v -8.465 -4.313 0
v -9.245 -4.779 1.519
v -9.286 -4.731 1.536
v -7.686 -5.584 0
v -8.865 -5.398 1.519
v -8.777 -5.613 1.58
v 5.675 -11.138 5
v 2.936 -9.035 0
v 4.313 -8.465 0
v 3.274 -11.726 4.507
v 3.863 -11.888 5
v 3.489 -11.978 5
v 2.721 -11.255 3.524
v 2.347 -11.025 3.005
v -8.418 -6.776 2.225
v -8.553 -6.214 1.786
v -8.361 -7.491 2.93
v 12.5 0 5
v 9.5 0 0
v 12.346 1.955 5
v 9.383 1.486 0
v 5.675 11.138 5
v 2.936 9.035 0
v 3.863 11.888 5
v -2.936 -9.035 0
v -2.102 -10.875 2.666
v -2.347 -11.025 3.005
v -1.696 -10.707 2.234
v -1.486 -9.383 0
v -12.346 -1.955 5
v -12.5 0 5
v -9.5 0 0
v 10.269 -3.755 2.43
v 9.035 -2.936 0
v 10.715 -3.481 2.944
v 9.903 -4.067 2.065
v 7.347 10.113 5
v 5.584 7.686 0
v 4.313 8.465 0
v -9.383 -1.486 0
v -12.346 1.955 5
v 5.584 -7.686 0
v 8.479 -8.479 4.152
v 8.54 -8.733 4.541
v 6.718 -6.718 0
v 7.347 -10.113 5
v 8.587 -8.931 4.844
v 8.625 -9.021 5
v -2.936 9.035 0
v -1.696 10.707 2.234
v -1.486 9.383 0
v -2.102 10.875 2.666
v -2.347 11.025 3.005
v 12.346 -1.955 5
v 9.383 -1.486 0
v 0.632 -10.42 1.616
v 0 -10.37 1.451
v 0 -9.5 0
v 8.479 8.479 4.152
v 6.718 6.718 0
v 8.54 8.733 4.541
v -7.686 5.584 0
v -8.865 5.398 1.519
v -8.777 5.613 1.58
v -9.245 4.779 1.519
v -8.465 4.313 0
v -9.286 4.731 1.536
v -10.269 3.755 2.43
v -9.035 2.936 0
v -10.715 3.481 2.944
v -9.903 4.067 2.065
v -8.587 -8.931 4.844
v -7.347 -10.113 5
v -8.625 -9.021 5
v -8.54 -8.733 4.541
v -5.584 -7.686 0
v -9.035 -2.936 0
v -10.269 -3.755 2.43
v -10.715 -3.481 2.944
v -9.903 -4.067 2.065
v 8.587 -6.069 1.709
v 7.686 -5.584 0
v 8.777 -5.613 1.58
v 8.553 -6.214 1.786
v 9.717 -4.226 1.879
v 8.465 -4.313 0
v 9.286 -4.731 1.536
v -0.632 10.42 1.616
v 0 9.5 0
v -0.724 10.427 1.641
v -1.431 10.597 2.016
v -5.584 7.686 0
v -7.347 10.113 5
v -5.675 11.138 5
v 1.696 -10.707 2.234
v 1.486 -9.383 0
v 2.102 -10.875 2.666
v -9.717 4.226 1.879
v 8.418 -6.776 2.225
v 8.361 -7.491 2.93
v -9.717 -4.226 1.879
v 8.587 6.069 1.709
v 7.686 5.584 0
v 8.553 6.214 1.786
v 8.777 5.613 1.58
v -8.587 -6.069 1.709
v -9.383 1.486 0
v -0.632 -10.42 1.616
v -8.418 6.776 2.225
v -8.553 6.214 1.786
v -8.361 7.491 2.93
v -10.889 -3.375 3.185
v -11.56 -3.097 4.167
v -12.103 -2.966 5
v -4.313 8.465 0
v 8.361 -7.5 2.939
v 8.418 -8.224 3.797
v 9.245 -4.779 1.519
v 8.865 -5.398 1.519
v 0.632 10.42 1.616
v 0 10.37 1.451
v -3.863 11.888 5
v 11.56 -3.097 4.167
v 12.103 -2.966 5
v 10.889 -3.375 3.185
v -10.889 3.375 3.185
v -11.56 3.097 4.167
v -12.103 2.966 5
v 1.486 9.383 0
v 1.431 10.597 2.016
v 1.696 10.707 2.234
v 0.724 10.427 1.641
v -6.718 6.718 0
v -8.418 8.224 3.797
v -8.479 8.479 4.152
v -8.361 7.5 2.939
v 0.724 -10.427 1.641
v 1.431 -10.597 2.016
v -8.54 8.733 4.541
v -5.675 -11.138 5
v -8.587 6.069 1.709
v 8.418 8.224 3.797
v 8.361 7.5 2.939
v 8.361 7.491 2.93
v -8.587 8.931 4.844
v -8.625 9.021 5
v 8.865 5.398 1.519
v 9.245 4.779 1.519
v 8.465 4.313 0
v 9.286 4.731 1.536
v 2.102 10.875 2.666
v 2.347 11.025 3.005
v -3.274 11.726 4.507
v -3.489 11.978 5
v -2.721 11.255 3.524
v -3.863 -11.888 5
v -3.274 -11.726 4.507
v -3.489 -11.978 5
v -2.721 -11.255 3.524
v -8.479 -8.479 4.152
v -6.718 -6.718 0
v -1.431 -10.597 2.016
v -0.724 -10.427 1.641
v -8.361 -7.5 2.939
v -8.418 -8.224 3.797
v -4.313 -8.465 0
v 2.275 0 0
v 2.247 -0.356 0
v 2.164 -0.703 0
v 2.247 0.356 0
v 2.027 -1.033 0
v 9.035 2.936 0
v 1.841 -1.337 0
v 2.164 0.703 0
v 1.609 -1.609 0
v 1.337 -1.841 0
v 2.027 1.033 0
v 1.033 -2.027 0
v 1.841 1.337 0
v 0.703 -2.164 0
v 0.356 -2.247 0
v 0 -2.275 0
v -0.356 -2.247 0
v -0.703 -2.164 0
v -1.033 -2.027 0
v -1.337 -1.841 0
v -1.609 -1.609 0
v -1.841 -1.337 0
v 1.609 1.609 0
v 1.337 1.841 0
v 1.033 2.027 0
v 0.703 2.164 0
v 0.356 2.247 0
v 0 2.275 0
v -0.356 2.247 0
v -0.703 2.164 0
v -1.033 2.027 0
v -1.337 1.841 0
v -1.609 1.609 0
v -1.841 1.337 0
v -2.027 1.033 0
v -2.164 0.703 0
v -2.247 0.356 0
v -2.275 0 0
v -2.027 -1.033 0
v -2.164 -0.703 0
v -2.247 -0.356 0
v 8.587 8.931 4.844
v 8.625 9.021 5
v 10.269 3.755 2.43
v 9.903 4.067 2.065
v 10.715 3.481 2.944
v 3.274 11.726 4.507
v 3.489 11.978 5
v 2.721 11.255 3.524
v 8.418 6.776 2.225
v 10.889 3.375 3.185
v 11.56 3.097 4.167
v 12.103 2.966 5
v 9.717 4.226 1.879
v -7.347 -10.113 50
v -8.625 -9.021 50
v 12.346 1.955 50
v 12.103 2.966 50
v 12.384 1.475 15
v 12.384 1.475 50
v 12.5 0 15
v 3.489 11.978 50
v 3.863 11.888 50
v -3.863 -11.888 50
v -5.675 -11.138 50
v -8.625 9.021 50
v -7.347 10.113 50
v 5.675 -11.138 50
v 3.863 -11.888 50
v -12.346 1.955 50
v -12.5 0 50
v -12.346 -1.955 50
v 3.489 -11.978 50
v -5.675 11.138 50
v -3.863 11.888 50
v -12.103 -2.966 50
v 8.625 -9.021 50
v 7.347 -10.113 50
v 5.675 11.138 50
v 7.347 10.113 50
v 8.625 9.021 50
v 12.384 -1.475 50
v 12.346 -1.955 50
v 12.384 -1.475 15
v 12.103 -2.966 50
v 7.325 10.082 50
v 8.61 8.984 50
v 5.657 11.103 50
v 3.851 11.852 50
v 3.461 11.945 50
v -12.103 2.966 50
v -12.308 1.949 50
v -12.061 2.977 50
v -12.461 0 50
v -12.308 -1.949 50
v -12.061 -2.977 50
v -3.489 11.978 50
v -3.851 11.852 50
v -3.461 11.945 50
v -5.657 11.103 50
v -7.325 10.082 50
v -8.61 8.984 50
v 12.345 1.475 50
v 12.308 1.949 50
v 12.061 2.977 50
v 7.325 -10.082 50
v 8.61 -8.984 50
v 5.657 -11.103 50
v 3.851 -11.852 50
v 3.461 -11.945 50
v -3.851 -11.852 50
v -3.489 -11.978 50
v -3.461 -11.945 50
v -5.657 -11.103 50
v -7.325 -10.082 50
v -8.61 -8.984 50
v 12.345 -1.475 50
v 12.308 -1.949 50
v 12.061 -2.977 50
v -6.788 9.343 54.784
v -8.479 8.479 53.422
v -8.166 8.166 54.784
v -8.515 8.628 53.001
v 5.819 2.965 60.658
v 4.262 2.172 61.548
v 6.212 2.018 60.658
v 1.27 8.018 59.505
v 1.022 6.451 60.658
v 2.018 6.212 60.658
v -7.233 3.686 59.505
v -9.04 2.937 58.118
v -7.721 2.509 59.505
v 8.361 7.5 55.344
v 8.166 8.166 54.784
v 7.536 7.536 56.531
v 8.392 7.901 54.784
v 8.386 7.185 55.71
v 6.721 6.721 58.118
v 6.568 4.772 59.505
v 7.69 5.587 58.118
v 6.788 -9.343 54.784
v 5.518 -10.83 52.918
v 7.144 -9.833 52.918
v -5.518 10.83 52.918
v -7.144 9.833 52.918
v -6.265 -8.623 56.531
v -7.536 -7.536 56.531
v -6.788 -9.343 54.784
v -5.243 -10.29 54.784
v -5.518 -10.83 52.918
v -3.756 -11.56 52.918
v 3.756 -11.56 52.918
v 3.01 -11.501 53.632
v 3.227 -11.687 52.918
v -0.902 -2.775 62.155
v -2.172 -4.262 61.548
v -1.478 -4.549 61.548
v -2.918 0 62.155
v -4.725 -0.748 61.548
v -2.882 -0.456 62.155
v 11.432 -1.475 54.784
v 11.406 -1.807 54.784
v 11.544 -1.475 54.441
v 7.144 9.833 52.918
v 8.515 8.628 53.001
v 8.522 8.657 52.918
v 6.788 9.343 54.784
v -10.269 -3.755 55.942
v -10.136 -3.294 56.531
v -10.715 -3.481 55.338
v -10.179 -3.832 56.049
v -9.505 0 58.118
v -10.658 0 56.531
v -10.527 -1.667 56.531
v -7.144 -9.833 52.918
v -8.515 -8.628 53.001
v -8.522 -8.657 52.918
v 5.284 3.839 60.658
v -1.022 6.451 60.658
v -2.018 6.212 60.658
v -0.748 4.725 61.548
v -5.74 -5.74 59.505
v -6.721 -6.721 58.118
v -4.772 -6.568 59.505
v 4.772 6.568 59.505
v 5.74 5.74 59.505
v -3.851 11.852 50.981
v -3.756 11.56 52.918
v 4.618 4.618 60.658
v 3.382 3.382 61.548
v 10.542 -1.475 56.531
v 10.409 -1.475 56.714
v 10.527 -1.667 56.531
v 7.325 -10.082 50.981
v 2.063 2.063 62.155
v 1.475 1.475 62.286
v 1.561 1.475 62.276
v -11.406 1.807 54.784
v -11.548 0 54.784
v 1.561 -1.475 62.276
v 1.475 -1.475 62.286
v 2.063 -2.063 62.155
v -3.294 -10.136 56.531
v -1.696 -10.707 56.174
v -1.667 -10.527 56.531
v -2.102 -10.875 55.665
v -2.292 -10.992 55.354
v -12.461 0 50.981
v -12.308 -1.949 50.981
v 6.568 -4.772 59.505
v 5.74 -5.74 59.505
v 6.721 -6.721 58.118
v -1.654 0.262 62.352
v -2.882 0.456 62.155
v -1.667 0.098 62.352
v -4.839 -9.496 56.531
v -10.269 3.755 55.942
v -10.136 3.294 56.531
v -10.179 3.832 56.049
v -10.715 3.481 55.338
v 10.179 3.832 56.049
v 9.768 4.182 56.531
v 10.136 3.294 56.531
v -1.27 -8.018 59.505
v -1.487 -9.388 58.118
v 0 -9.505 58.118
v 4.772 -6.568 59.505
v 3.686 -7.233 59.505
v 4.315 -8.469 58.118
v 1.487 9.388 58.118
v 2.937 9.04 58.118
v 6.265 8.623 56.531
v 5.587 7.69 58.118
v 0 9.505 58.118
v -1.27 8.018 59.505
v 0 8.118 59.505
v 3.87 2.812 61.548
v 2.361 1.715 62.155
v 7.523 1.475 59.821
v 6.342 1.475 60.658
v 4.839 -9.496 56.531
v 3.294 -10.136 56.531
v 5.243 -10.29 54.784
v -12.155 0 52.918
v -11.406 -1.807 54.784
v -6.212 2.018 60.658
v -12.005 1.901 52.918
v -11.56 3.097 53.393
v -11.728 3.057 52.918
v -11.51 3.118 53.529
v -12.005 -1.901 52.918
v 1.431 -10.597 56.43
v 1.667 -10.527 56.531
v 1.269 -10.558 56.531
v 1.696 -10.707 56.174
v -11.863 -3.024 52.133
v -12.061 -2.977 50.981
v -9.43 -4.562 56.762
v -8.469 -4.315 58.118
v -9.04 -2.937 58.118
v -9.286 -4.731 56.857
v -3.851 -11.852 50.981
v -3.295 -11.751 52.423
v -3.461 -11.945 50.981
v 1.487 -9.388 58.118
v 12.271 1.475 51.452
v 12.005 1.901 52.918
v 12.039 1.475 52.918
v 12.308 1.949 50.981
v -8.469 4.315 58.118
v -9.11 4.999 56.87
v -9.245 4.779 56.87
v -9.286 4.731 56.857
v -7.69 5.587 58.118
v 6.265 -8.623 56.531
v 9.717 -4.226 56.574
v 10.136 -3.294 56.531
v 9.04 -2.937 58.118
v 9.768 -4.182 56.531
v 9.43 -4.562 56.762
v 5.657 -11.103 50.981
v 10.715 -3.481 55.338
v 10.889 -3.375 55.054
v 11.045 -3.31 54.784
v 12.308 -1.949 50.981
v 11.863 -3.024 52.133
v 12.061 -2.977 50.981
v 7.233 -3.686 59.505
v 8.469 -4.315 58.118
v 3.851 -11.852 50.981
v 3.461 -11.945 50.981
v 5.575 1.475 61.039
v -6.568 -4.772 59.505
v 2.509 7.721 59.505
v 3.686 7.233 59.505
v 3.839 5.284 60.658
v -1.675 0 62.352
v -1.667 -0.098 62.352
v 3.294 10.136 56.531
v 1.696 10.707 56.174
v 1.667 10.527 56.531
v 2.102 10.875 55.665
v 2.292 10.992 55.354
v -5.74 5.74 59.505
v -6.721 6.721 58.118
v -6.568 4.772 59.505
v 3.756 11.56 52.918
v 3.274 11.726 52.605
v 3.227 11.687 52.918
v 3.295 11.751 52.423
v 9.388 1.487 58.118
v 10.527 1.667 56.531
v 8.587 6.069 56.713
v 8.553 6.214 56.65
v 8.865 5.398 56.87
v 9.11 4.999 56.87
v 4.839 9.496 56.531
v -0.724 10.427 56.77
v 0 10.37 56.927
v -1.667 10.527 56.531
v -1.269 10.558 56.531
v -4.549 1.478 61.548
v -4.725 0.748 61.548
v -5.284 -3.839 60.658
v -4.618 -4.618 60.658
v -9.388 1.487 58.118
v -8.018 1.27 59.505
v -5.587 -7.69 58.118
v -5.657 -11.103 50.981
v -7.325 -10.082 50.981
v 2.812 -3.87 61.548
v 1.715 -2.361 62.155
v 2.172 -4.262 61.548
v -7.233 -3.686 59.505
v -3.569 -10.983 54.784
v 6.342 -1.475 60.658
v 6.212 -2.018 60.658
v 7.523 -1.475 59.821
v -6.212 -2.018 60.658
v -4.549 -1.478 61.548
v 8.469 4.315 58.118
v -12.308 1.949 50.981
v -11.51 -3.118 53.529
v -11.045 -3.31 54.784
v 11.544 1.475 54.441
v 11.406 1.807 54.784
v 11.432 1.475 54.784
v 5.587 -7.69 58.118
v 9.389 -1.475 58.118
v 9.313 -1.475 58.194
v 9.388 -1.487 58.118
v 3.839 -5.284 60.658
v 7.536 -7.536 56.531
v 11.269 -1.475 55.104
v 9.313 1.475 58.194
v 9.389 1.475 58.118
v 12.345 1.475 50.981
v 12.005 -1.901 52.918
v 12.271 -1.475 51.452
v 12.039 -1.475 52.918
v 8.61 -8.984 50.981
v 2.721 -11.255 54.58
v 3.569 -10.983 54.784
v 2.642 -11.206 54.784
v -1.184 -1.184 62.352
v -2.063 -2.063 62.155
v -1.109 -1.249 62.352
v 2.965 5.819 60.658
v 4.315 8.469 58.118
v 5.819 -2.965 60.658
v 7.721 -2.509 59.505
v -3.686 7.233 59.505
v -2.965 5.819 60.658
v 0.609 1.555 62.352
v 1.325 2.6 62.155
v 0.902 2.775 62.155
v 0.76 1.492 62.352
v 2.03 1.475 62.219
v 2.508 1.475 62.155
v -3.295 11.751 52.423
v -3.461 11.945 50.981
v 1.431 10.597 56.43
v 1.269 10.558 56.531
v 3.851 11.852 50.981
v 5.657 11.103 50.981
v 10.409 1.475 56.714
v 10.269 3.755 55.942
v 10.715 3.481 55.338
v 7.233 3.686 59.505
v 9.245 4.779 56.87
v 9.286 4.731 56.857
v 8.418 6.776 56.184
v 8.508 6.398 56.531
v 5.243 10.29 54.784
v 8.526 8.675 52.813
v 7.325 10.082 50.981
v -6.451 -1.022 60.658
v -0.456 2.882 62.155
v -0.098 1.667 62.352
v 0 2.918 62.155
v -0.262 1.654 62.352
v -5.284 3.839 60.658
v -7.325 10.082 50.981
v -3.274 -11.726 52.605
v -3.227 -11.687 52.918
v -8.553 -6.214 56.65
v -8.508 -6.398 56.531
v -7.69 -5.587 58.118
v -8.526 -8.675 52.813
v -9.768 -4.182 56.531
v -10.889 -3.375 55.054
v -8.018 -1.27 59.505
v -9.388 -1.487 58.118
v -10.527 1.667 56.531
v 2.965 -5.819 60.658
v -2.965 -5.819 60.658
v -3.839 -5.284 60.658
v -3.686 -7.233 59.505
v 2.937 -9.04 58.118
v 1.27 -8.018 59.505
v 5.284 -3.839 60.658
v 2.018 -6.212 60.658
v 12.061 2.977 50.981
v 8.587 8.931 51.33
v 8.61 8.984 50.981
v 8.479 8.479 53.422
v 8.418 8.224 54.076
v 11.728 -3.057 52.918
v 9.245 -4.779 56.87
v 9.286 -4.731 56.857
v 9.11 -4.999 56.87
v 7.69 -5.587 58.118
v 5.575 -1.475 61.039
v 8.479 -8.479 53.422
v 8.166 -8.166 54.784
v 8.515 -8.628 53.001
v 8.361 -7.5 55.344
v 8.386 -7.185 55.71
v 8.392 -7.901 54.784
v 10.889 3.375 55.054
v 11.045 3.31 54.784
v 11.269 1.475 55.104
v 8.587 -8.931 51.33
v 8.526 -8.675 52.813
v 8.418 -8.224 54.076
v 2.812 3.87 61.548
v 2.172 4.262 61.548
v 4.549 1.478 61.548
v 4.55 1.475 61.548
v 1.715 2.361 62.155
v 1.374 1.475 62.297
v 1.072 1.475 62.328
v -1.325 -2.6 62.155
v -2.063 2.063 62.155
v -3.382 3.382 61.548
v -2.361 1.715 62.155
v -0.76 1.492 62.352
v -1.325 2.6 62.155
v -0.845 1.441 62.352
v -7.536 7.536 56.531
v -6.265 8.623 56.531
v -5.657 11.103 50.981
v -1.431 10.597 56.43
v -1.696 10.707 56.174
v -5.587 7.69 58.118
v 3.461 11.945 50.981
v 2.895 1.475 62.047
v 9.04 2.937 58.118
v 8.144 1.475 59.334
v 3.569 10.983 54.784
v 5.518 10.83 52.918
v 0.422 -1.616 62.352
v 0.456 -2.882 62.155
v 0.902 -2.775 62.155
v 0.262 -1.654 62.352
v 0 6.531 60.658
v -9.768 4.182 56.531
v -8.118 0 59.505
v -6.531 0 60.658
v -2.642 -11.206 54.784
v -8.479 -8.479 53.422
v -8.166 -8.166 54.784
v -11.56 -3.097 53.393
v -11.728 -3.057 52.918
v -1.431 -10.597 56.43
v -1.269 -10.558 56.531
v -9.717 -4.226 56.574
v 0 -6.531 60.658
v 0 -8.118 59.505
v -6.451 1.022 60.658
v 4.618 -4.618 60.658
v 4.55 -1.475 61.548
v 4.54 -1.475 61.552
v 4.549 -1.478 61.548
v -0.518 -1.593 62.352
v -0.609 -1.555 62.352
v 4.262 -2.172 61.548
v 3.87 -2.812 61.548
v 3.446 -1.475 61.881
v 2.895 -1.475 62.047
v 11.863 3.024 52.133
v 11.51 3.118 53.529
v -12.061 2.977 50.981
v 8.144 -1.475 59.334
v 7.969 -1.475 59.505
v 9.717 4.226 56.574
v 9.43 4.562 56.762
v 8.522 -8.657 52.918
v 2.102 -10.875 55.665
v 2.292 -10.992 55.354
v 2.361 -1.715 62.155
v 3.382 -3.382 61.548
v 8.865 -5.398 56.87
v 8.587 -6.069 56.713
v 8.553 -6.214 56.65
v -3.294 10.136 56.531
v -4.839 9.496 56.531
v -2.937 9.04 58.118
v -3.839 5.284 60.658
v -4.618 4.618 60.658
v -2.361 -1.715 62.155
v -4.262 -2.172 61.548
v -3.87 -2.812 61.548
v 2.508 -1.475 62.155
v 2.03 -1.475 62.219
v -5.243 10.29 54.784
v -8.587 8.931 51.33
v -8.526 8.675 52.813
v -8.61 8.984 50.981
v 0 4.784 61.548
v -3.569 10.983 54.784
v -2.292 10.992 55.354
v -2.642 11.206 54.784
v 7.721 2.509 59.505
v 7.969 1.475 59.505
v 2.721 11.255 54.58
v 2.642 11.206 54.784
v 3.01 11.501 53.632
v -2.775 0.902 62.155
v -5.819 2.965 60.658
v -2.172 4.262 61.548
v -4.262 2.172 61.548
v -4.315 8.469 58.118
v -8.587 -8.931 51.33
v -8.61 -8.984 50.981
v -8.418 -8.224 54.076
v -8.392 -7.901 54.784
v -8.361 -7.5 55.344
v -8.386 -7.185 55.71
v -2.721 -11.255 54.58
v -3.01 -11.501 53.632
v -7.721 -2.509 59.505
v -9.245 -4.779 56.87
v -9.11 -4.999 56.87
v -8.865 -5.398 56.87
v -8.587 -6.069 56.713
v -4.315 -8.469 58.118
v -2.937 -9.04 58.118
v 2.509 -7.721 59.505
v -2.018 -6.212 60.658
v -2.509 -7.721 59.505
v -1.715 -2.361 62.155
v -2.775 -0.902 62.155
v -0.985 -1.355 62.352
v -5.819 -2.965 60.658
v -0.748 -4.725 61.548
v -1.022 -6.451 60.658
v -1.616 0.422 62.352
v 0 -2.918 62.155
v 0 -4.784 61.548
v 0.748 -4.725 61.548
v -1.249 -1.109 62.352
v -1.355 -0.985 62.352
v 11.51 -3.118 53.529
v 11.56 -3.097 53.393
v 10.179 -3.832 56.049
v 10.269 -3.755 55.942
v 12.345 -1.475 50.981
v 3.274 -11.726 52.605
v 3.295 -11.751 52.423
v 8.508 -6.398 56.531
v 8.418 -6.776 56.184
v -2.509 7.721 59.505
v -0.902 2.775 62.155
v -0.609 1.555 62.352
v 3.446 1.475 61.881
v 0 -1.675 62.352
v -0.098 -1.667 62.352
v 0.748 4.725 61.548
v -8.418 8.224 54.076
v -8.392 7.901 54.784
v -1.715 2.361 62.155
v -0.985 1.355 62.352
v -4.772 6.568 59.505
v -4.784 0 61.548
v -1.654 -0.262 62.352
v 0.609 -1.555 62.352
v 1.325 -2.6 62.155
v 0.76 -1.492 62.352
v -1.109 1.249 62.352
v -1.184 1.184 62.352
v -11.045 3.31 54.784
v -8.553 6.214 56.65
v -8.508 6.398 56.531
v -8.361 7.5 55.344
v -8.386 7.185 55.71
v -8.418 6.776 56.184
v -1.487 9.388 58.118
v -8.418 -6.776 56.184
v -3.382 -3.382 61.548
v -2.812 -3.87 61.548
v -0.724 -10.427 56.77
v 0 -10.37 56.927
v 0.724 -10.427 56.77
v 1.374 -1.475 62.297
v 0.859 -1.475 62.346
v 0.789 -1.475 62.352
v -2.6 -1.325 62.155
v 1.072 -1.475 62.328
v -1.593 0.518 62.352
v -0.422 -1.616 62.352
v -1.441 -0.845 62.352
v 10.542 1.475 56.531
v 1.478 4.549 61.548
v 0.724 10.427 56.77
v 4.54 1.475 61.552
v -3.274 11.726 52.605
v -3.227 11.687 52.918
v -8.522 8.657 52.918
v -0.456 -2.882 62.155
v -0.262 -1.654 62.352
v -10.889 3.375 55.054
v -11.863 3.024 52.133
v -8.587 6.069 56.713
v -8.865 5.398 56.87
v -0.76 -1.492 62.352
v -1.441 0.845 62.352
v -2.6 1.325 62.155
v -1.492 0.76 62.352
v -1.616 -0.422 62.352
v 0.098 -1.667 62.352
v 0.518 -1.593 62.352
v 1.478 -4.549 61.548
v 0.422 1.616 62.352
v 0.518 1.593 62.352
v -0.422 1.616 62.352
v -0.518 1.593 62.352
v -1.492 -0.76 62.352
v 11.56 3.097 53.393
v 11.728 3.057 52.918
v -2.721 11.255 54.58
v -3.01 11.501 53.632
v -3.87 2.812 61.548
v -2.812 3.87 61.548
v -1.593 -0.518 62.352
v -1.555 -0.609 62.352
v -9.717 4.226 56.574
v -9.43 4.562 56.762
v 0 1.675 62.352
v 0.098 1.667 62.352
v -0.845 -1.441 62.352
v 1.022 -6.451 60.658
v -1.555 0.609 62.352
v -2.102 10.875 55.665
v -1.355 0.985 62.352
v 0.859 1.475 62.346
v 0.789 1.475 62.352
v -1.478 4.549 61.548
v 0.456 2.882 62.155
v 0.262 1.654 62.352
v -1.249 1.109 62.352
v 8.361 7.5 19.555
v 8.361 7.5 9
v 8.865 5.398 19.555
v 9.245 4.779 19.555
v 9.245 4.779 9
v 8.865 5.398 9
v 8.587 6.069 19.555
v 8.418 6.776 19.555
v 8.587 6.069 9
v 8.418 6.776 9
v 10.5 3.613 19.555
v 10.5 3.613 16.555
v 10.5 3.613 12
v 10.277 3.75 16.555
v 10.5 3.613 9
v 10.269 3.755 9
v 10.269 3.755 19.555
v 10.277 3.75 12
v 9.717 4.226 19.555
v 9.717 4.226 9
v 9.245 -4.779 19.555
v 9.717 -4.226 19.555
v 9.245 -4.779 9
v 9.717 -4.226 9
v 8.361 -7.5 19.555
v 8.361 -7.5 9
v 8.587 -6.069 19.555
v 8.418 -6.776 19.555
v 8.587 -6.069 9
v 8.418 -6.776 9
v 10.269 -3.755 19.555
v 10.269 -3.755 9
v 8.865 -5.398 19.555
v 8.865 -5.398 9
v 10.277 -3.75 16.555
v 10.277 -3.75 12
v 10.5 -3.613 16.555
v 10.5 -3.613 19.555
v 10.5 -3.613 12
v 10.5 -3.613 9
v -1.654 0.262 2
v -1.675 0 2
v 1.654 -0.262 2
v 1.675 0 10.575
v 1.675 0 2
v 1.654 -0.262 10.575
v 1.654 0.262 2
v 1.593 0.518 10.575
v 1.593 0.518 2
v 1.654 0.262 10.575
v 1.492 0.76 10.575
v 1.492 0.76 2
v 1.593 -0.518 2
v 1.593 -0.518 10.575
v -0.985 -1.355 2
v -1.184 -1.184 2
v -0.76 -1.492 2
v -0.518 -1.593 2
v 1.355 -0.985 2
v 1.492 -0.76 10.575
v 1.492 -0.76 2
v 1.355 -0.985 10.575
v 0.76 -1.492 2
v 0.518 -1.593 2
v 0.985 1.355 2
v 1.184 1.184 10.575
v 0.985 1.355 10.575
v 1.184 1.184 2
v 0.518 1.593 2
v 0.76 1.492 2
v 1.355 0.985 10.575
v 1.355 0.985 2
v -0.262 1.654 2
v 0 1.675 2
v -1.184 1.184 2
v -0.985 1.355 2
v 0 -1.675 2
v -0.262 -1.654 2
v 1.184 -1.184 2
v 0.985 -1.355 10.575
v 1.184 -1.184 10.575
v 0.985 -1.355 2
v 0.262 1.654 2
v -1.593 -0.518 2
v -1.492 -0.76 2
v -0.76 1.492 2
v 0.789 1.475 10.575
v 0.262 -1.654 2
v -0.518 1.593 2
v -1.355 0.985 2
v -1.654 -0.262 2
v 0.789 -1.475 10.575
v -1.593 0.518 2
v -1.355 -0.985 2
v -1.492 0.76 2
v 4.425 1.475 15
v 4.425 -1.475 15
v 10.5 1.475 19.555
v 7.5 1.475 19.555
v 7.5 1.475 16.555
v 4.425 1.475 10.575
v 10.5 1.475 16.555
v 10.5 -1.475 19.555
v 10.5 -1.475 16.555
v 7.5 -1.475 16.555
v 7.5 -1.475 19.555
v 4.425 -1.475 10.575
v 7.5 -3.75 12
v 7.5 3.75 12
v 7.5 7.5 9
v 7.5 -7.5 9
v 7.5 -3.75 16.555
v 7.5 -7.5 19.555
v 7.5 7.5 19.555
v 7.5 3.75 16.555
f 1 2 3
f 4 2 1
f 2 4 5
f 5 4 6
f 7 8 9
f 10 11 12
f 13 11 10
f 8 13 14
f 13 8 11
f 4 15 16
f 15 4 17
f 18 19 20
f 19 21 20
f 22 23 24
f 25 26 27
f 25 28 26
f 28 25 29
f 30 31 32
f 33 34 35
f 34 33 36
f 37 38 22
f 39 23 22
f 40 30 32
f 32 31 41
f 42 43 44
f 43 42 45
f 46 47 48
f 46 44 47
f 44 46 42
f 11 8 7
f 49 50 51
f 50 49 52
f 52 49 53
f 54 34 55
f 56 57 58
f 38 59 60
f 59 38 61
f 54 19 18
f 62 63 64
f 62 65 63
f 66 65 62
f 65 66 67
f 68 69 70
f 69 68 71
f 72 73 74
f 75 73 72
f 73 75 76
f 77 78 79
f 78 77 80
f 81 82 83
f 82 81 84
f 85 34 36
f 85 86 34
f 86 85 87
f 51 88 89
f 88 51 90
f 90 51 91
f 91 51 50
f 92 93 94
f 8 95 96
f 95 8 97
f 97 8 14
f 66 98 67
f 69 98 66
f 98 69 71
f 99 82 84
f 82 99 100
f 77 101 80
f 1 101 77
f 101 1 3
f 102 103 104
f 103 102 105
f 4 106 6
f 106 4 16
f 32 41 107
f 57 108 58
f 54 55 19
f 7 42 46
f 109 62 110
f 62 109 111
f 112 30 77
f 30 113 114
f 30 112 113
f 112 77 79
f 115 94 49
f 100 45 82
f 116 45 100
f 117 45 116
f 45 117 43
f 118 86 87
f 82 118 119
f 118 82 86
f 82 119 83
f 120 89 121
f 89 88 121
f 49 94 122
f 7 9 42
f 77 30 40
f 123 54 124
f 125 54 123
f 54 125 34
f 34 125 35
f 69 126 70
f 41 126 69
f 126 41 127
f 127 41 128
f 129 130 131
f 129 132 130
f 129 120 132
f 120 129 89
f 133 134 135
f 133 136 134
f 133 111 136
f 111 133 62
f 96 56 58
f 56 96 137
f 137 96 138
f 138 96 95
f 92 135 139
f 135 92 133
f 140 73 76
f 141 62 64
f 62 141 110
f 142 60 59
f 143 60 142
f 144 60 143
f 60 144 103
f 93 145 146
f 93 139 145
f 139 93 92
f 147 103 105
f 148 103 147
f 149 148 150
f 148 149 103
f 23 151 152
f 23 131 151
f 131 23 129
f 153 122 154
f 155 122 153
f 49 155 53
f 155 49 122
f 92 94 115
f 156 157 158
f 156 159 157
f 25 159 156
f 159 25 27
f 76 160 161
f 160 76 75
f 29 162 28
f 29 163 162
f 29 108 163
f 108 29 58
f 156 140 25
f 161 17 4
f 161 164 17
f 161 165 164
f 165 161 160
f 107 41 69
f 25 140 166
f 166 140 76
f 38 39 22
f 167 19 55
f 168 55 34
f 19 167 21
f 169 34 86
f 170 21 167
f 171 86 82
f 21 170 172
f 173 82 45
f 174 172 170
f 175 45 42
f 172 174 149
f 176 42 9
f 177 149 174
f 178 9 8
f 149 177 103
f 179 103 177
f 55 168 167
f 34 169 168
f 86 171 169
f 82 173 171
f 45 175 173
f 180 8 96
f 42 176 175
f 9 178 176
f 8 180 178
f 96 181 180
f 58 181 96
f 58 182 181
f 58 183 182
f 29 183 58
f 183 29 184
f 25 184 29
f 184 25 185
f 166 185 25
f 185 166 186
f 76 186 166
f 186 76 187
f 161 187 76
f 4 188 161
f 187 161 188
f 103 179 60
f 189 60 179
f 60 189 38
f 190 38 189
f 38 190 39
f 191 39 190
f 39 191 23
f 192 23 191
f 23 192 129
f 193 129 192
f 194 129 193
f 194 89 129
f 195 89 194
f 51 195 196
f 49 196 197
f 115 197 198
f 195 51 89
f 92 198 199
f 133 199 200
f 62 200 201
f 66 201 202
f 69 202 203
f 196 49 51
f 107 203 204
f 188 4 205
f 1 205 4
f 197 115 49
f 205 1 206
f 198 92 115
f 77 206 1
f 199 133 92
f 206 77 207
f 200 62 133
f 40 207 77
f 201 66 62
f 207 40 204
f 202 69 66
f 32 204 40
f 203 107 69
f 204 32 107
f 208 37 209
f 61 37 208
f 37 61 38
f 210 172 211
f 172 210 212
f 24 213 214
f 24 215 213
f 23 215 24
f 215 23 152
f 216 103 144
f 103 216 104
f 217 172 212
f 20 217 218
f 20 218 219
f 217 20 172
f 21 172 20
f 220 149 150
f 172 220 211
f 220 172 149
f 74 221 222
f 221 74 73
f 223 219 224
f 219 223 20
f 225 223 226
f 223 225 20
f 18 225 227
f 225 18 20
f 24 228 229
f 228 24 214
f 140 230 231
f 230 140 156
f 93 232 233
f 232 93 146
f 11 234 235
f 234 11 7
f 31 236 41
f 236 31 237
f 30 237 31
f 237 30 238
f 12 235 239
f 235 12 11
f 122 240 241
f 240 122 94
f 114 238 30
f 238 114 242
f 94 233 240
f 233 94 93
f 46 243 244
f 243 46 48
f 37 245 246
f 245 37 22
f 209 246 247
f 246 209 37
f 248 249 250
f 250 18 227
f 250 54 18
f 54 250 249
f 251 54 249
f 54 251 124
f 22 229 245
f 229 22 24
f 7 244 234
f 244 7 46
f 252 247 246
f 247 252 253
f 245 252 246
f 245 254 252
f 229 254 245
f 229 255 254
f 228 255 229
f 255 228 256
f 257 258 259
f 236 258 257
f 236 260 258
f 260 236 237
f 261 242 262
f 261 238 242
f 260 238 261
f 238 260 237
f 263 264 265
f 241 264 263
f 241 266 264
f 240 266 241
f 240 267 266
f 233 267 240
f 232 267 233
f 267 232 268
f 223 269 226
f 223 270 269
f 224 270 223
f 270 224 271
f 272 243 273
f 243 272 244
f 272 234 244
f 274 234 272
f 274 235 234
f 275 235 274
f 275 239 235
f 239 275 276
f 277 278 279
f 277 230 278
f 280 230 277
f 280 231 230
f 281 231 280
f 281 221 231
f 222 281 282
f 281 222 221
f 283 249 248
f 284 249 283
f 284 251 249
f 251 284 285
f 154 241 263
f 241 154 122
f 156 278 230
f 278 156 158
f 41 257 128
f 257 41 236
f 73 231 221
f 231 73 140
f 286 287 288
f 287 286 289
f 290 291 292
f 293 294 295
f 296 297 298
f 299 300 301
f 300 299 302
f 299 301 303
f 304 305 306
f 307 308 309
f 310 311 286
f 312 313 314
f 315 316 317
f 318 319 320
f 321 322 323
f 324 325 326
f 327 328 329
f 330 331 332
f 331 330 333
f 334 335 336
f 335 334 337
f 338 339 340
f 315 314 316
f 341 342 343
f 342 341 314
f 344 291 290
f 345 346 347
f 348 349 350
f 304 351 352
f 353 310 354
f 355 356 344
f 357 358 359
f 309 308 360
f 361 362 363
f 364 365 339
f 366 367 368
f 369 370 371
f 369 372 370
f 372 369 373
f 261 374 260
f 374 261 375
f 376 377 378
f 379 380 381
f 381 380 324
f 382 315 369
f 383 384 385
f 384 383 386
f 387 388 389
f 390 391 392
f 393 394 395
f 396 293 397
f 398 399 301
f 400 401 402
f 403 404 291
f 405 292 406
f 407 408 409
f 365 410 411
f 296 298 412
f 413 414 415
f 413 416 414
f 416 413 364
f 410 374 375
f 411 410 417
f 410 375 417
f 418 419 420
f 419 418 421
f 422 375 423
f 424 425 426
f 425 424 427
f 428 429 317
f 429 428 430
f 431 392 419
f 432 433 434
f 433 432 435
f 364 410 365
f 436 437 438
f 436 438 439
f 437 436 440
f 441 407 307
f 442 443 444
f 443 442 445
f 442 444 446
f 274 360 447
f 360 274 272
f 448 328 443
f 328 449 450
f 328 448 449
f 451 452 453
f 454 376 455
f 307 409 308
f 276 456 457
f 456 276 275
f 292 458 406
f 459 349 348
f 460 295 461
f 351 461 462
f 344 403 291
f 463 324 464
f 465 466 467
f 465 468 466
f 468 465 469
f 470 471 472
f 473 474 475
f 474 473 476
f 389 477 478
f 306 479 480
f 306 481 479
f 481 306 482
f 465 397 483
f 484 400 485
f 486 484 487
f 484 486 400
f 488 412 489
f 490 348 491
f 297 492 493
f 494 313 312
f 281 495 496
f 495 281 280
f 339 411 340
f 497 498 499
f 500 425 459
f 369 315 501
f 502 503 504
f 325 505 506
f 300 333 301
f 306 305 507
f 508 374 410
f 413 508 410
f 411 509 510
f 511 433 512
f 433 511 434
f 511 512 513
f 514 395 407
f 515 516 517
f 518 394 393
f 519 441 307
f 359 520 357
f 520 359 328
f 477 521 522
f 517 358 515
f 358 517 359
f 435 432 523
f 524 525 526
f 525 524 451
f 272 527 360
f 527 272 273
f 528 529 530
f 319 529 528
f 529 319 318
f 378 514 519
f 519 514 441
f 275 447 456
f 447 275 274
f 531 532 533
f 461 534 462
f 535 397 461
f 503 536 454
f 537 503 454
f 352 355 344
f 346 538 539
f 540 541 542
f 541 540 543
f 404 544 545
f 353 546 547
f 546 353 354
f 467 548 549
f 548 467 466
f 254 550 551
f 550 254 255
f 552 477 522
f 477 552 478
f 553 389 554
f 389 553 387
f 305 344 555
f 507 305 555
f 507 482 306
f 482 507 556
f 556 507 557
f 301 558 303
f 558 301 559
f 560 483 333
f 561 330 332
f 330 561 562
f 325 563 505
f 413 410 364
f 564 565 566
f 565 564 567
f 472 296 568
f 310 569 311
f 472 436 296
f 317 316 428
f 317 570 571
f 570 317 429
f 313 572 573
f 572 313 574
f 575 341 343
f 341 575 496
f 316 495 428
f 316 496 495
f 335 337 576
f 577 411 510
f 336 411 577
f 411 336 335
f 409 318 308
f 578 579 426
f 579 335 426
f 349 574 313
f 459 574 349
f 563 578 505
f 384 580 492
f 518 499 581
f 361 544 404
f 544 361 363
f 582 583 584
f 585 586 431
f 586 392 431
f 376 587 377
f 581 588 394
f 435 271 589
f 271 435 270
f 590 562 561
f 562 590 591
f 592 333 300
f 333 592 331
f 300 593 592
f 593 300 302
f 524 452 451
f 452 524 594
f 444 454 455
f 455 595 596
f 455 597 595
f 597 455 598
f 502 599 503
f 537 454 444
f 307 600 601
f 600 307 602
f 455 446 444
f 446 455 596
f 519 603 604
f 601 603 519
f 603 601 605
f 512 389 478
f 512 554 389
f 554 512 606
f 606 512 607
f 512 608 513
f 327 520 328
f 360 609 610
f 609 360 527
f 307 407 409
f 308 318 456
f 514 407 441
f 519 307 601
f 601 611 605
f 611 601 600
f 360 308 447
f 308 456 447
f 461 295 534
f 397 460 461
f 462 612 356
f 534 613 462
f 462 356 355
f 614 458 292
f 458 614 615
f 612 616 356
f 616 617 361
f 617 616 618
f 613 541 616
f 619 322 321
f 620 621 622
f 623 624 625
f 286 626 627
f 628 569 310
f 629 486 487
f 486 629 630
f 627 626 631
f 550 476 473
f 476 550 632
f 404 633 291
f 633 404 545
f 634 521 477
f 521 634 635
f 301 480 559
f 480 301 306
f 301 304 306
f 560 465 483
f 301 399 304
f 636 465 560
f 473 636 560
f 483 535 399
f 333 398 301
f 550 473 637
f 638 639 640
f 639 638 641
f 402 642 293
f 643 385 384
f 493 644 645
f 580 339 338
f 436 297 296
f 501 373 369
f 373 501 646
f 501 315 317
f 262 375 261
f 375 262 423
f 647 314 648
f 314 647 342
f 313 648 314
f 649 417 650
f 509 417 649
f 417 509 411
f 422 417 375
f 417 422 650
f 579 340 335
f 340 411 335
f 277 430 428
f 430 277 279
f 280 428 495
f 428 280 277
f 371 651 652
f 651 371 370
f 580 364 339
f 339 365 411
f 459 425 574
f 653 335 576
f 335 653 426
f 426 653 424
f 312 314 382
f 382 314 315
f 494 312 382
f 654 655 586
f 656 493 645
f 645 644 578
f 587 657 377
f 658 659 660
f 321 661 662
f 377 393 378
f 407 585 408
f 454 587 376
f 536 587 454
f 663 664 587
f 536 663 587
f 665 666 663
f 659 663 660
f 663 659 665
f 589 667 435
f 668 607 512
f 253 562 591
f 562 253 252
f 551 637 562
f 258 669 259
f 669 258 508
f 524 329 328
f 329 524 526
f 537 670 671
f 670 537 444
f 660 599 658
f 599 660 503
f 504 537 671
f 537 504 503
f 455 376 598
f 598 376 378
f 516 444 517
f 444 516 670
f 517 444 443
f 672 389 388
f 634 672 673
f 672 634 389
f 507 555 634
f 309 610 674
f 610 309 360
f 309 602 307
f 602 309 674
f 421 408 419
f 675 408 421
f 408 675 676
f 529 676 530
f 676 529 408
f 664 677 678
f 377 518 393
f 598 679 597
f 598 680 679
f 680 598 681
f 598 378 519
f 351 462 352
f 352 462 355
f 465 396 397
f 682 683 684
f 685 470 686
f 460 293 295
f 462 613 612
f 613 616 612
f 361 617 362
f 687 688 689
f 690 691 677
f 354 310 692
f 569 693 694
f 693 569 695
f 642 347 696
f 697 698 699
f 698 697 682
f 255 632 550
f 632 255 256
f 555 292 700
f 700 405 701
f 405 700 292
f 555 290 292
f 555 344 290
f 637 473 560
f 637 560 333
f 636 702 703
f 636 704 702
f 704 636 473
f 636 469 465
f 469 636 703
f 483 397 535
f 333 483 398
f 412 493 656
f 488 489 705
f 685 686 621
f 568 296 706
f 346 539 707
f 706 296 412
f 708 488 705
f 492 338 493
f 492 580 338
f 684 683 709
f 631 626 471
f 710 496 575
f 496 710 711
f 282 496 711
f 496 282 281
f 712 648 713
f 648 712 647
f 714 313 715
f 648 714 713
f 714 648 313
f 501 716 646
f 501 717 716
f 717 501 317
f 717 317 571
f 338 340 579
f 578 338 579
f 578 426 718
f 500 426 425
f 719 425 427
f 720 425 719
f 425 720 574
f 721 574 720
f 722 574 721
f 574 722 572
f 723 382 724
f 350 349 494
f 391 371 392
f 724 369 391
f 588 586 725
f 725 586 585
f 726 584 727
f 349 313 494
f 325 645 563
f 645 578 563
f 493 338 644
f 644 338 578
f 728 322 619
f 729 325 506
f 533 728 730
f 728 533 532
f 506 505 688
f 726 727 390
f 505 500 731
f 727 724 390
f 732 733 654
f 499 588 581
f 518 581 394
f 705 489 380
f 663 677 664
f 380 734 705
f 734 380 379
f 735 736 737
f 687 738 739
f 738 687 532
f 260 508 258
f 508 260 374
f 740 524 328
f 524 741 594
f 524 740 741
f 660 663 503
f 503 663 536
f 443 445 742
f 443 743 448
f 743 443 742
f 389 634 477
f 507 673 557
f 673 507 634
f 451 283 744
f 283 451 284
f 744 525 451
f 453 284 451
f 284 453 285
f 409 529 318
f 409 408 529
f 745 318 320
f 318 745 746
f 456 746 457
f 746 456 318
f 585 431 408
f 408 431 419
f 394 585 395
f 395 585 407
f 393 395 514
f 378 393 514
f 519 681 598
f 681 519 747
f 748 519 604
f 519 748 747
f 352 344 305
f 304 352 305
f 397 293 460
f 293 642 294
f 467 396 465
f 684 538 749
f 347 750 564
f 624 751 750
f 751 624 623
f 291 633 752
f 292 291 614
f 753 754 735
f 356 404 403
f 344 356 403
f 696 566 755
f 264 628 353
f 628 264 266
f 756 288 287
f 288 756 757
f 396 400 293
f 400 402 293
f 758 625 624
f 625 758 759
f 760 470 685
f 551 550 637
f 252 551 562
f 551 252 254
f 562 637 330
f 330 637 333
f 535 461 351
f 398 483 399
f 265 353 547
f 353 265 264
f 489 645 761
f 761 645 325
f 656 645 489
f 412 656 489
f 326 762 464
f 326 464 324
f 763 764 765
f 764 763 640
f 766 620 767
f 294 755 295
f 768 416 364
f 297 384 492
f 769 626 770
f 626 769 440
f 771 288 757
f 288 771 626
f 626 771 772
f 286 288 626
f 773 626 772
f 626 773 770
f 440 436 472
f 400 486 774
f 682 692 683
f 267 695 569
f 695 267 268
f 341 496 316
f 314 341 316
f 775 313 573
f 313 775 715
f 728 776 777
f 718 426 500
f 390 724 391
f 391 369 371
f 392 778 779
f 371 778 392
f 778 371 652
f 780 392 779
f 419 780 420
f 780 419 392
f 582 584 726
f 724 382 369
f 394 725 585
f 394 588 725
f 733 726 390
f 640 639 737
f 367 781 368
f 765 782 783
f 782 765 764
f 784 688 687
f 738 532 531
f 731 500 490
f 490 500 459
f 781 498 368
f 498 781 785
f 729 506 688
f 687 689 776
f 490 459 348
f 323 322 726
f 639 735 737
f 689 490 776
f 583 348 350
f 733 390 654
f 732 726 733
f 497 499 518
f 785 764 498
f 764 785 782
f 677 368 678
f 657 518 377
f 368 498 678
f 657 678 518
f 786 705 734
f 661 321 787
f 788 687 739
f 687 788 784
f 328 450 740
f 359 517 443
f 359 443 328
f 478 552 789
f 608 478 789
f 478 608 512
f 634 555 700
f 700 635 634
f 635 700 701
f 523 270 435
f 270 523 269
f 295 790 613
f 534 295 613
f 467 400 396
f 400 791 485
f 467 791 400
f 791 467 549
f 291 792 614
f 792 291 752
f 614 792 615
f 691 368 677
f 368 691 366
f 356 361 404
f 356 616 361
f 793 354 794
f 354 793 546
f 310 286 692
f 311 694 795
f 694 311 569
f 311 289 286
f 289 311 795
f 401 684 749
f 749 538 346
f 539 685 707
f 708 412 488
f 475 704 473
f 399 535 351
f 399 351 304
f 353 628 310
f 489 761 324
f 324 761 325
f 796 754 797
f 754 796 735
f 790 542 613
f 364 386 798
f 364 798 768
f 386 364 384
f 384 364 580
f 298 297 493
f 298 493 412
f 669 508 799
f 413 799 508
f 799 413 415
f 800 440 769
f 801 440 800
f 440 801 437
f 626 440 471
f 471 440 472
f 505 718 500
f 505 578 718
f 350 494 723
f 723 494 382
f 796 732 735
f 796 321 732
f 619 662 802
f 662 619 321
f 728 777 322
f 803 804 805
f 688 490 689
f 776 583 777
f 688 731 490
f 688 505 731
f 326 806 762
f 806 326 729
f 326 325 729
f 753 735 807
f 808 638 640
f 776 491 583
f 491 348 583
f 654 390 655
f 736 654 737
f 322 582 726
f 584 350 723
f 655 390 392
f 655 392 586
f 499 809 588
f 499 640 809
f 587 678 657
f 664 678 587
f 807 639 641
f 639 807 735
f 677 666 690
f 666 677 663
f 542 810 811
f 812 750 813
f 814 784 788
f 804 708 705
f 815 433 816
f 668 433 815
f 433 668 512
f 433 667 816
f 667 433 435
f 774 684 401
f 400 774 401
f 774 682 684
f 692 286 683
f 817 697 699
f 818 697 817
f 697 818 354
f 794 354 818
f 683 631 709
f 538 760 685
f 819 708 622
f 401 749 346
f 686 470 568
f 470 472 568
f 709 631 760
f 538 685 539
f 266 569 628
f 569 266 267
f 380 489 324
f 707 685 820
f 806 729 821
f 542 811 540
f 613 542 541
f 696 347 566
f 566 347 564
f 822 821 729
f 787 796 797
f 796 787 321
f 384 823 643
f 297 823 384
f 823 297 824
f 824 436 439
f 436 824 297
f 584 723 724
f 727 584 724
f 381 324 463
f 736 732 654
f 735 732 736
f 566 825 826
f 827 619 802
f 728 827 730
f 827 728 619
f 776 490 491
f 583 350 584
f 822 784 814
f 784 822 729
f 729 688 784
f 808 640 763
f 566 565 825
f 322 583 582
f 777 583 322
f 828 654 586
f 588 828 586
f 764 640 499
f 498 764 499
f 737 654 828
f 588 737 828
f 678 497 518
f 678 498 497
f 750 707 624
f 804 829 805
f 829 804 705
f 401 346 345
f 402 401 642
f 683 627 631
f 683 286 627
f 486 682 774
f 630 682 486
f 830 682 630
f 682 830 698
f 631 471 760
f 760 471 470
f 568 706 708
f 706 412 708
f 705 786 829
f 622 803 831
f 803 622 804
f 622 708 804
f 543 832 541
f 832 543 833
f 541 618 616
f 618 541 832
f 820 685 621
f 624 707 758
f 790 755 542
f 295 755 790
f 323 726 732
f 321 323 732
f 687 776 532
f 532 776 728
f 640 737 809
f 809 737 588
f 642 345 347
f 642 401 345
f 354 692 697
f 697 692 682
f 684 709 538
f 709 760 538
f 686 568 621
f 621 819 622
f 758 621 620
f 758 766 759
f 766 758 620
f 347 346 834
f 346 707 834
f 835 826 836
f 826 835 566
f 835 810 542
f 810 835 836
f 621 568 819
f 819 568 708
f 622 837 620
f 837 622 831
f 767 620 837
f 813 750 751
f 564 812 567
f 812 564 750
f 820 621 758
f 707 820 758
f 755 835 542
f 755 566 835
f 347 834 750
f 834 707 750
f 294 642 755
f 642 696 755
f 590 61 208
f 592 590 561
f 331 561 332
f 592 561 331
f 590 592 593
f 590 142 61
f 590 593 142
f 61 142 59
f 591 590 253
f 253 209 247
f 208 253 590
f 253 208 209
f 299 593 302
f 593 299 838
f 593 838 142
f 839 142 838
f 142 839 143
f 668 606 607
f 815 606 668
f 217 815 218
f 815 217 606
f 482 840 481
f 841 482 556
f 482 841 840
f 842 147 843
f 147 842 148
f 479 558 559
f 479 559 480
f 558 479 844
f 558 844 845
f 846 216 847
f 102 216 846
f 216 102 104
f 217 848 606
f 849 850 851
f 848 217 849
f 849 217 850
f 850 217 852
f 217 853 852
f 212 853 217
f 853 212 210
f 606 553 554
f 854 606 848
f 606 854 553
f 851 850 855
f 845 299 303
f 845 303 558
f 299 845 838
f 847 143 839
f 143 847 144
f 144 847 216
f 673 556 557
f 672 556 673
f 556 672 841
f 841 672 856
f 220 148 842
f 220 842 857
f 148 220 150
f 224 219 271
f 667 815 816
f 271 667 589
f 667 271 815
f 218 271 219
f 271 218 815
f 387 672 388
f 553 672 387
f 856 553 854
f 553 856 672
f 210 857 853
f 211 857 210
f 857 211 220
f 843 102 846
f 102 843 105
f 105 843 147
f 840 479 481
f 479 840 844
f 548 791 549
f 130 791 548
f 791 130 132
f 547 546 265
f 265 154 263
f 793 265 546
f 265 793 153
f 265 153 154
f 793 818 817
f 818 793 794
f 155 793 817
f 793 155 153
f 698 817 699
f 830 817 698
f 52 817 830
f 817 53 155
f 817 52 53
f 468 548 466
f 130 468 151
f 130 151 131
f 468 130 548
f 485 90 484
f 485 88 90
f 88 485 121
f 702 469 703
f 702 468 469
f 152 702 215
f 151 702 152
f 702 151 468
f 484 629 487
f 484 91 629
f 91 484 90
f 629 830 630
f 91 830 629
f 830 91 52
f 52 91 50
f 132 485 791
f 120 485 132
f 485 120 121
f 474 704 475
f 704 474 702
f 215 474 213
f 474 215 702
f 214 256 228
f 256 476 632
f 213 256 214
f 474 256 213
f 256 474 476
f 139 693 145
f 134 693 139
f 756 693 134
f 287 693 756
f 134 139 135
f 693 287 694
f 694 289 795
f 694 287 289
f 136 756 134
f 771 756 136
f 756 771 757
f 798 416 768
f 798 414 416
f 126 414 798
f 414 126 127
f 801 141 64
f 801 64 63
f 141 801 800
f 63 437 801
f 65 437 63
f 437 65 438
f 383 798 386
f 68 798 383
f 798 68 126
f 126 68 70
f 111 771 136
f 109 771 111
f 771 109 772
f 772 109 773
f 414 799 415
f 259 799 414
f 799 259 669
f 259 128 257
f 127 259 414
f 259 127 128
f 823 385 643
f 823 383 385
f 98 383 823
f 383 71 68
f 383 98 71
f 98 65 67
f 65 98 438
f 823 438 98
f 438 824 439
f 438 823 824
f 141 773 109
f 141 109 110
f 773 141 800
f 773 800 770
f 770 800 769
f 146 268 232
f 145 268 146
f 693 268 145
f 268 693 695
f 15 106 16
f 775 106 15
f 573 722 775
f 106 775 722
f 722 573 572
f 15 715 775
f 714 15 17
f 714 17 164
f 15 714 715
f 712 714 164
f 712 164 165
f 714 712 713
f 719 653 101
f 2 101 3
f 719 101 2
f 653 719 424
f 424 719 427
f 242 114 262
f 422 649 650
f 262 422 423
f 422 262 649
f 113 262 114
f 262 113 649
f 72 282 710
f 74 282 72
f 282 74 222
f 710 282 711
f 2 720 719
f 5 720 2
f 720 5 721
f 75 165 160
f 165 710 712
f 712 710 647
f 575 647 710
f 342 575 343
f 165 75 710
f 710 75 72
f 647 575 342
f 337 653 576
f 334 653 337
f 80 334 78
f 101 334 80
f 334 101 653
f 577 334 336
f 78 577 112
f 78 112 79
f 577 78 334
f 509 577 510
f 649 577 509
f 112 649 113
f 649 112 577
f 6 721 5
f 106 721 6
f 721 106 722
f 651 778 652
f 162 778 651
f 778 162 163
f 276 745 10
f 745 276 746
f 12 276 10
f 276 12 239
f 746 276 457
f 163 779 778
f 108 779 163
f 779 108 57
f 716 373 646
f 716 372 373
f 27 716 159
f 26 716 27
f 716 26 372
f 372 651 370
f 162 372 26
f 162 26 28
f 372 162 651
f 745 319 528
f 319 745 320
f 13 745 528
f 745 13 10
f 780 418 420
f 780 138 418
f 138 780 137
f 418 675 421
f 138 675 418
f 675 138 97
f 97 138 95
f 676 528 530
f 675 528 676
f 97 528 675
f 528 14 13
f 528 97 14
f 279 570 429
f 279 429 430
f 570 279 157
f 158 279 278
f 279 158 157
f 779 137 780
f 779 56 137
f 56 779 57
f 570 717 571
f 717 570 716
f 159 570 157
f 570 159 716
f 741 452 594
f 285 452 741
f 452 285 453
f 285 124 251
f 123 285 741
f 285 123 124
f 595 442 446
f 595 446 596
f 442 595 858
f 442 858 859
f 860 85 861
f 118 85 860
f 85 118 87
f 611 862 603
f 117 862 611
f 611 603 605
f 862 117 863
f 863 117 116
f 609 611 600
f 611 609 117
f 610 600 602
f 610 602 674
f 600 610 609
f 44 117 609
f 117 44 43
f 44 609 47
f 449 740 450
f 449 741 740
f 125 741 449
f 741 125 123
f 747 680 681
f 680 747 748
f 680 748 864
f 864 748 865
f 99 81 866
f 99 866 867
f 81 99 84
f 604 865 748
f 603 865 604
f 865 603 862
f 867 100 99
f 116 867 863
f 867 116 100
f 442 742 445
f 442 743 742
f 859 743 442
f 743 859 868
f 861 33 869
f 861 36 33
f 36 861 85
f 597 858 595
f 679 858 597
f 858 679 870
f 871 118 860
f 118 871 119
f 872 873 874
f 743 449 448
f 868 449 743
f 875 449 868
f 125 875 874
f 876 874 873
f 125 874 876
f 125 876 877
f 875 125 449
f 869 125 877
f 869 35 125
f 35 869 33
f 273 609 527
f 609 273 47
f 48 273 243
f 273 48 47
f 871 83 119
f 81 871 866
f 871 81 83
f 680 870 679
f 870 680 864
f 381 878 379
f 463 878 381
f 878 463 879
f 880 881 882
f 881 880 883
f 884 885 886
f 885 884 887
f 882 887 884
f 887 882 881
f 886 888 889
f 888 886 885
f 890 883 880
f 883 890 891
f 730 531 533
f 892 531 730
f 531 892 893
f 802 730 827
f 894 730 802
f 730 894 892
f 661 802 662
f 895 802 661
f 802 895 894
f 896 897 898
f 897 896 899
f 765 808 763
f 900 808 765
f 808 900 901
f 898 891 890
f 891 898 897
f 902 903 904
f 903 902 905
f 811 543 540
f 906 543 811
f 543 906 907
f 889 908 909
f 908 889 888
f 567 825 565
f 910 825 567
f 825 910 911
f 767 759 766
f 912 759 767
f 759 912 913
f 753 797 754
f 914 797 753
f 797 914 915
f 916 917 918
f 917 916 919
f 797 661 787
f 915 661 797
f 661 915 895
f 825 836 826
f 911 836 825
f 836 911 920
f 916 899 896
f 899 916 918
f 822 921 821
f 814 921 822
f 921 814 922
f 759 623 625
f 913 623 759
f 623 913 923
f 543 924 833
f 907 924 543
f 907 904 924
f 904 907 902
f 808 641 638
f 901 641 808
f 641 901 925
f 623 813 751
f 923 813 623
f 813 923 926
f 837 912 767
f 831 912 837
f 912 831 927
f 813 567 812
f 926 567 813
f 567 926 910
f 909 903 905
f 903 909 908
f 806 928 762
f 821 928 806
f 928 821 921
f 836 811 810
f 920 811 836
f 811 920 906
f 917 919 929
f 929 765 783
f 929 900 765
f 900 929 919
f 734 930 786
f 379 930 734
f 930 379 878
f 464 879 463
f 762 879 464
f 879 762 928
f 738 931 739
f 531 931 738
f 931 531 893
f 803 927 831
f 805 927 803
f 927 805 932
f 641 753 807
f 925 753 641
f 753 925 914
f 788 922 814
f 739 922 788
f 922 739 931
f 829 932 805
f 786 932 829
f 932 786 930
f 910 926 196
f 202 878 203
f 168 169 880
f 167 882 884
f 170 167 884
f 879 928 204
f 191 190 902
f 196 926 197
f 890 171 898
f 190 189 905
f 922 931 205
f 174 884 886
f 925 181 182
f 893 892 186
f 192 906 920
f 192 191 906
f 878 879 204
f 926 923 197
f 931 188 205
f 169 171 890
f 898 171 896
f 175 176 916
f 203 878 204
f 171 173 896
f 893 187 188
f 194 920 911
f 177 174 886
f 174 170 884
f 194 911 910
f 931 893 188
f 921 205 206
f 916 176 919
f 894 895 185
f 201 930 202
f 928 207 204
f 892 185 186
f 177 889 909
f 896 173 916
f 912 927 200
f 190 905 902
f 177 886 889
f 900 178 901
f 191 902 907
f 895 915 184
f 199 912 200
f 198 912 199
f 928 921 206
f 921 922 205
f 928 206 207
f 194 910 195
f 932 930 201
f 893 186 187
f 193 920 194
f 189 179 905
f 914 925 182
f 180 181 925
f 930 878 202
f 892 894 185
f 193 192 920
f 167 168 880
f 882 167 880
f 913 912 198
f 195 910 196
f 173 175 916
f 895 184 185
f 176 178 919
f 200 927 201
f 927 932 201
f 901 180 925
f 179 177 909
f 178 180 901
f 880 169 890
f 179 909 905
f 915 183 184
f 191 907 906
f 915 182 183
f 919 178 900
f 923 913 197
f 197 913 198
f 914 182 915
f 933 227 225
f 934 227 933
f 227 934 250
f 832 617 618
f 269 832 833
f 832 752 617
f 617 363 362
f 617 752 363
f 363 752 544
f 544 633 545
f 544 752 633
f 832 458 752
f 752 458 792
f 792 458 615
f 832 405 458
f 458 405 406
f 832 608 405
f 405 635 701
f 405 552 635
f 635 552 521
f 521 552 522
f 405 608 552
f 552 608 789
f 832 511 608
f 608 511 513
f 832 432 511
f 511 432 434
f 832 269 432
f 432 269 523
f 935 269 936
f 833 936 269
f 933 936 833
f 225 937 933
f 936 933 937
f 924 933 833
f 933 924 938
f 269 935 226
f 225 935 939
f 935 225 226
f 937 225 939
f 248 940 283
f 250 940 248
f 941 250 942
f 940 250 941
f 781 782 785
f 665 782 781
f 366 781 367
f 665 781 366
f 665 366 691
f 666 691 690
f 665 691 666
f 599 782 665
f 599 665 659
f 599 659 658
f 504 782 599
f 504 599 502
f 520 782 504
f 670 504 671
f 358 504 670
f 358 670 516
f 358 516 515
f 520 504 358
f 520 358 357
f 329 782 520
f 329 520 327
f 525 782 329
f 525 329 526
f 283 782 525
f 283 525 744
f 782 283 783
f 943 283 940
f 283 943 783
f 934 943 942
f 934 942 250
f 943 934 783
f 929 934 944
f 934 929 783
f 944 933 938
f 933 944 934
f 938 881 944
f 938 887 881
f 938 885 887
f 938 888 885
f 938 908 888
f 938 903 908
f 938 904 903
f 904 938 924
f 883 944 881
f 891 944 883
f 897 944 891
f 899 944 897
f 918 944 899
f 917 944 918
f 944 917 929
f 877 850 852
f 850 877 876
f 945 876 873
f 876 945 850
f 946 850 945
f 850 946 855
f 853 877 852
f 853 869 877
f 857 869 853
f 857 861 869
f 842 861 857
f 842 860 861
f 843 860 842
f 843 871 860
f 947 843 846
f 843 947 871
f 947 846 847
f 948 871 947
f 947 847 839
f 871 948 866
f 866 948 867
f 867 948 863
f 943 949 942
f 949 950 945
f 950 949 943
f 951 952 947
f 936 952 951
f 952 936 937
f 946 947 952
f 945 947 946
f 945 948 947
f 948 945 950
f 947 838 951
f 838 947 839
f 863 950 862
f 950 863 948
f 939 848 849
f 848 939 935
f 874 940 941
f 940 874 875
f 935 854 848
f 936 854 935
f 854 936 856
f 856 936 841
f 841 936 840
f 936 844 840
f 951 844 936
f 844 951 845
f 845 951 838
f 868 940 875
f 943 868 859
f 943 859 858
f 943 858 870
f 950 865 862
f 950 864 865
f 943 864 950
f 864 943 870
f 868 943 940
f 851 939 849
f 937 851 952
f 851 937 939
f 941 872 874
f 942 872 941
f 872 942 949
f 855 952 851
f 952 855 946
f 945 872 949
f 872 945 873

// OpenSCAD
// [FL_INDEX: keywords="openscad, 3d_parametric, Handle_for_Allen_Hex_Wrench_Key, csg_solid" | COT="Parametric OpenSCAD design from 3DCodeverse"]
// Title: Handle for Allen/Hex Wrench/Key

// Diameter of hole for the hex wrench
hex_size = 2.8;

// Increase slot size by this amount
hole_delta = 0.15;

// Diameter of the handle
handle_diameter = 25;

handle(hex_size);

module handle(hex_size)
{
	hex_radius = (hex_size + hole_delta) / 2;
	hex_size = hex_size + hole_delta;
	handle_radius = handle_diameter / 2;
	knurl_offset = handle_radius * 1.2;
	handle_height = 50;
	slot_width = 1.2 * handle_radius;
	zip_tie_back = 0.6 * handle_radius;
	slot_bottom = 15;

	$fn=40;									// Control quality of mesh

	hole_radius = hex_radius + .2;	// Give a little more room for small hole

	difference()
	{
		union()
		{
			cylinder(h = 5, r1 = handle_radius - 3, r2 = handle_radius);
			translate(v=[0, 0, 5])
				cylinder(h = handle_height - 5, r = handle_radius);
			translate(v=[0, 0, handle_height])
				sphere(handle_radius);
		}

		for (angle = [30:60:360])
			translate(v=[knurl_offset * cos(angle), knurl_offset * sin(angle), 0])
				cylinder(h = handle_height + handle_radius, r = handle_radius / 2.7);

		// Shaft hole
		cylinder(h = handle_height + handle_radius, r = hole_radius);

		// Small cone at bottom
		cylinder(h = 2, r1 = hole_radius + .6, r2 = hole_radius);

		// Slot for the wrench
		translate(v=[0, -hex_size / 2, slot_bottom])
			cube(size = [handle_radius, hex_size, handle_height + handle_radius]);

		// Slot for bend in wrench
		translate(v=[0, -hex_size / 2, slot_bottom - 1.5 * hex_size])
			cube(size = [1.5 * hex_size, hex_size, 2 * hex_size]);

		// Lower slot for zip-tie
		translate(v=[zip_tie_back, -slot_width / 2, slot_bottom - 6])
			cube(size=[3, slot_width, 3]);

		// Upper slot for zip tie
		translate(v=[zip_tie_back, -slot_width / 2, slot_bottom + sin(60) * hex_size - 1])
			cube(size=[3, slot_width, 3]);

		// Zip Tie Opening
		translate(v=[zip_tie_back, slot_width / 4, slot_bottom - 6])
			cube(size=[3, slot_width / 4, 6 + sin(60) * hex_size + 2]);

		translate(v=[zip_tie_back, -slot_width / 2, slot_bottom - 6])
			cube(size=[3, slot_width / 4, 6 + sin(60) * hex_size + 2]);
	}
}
